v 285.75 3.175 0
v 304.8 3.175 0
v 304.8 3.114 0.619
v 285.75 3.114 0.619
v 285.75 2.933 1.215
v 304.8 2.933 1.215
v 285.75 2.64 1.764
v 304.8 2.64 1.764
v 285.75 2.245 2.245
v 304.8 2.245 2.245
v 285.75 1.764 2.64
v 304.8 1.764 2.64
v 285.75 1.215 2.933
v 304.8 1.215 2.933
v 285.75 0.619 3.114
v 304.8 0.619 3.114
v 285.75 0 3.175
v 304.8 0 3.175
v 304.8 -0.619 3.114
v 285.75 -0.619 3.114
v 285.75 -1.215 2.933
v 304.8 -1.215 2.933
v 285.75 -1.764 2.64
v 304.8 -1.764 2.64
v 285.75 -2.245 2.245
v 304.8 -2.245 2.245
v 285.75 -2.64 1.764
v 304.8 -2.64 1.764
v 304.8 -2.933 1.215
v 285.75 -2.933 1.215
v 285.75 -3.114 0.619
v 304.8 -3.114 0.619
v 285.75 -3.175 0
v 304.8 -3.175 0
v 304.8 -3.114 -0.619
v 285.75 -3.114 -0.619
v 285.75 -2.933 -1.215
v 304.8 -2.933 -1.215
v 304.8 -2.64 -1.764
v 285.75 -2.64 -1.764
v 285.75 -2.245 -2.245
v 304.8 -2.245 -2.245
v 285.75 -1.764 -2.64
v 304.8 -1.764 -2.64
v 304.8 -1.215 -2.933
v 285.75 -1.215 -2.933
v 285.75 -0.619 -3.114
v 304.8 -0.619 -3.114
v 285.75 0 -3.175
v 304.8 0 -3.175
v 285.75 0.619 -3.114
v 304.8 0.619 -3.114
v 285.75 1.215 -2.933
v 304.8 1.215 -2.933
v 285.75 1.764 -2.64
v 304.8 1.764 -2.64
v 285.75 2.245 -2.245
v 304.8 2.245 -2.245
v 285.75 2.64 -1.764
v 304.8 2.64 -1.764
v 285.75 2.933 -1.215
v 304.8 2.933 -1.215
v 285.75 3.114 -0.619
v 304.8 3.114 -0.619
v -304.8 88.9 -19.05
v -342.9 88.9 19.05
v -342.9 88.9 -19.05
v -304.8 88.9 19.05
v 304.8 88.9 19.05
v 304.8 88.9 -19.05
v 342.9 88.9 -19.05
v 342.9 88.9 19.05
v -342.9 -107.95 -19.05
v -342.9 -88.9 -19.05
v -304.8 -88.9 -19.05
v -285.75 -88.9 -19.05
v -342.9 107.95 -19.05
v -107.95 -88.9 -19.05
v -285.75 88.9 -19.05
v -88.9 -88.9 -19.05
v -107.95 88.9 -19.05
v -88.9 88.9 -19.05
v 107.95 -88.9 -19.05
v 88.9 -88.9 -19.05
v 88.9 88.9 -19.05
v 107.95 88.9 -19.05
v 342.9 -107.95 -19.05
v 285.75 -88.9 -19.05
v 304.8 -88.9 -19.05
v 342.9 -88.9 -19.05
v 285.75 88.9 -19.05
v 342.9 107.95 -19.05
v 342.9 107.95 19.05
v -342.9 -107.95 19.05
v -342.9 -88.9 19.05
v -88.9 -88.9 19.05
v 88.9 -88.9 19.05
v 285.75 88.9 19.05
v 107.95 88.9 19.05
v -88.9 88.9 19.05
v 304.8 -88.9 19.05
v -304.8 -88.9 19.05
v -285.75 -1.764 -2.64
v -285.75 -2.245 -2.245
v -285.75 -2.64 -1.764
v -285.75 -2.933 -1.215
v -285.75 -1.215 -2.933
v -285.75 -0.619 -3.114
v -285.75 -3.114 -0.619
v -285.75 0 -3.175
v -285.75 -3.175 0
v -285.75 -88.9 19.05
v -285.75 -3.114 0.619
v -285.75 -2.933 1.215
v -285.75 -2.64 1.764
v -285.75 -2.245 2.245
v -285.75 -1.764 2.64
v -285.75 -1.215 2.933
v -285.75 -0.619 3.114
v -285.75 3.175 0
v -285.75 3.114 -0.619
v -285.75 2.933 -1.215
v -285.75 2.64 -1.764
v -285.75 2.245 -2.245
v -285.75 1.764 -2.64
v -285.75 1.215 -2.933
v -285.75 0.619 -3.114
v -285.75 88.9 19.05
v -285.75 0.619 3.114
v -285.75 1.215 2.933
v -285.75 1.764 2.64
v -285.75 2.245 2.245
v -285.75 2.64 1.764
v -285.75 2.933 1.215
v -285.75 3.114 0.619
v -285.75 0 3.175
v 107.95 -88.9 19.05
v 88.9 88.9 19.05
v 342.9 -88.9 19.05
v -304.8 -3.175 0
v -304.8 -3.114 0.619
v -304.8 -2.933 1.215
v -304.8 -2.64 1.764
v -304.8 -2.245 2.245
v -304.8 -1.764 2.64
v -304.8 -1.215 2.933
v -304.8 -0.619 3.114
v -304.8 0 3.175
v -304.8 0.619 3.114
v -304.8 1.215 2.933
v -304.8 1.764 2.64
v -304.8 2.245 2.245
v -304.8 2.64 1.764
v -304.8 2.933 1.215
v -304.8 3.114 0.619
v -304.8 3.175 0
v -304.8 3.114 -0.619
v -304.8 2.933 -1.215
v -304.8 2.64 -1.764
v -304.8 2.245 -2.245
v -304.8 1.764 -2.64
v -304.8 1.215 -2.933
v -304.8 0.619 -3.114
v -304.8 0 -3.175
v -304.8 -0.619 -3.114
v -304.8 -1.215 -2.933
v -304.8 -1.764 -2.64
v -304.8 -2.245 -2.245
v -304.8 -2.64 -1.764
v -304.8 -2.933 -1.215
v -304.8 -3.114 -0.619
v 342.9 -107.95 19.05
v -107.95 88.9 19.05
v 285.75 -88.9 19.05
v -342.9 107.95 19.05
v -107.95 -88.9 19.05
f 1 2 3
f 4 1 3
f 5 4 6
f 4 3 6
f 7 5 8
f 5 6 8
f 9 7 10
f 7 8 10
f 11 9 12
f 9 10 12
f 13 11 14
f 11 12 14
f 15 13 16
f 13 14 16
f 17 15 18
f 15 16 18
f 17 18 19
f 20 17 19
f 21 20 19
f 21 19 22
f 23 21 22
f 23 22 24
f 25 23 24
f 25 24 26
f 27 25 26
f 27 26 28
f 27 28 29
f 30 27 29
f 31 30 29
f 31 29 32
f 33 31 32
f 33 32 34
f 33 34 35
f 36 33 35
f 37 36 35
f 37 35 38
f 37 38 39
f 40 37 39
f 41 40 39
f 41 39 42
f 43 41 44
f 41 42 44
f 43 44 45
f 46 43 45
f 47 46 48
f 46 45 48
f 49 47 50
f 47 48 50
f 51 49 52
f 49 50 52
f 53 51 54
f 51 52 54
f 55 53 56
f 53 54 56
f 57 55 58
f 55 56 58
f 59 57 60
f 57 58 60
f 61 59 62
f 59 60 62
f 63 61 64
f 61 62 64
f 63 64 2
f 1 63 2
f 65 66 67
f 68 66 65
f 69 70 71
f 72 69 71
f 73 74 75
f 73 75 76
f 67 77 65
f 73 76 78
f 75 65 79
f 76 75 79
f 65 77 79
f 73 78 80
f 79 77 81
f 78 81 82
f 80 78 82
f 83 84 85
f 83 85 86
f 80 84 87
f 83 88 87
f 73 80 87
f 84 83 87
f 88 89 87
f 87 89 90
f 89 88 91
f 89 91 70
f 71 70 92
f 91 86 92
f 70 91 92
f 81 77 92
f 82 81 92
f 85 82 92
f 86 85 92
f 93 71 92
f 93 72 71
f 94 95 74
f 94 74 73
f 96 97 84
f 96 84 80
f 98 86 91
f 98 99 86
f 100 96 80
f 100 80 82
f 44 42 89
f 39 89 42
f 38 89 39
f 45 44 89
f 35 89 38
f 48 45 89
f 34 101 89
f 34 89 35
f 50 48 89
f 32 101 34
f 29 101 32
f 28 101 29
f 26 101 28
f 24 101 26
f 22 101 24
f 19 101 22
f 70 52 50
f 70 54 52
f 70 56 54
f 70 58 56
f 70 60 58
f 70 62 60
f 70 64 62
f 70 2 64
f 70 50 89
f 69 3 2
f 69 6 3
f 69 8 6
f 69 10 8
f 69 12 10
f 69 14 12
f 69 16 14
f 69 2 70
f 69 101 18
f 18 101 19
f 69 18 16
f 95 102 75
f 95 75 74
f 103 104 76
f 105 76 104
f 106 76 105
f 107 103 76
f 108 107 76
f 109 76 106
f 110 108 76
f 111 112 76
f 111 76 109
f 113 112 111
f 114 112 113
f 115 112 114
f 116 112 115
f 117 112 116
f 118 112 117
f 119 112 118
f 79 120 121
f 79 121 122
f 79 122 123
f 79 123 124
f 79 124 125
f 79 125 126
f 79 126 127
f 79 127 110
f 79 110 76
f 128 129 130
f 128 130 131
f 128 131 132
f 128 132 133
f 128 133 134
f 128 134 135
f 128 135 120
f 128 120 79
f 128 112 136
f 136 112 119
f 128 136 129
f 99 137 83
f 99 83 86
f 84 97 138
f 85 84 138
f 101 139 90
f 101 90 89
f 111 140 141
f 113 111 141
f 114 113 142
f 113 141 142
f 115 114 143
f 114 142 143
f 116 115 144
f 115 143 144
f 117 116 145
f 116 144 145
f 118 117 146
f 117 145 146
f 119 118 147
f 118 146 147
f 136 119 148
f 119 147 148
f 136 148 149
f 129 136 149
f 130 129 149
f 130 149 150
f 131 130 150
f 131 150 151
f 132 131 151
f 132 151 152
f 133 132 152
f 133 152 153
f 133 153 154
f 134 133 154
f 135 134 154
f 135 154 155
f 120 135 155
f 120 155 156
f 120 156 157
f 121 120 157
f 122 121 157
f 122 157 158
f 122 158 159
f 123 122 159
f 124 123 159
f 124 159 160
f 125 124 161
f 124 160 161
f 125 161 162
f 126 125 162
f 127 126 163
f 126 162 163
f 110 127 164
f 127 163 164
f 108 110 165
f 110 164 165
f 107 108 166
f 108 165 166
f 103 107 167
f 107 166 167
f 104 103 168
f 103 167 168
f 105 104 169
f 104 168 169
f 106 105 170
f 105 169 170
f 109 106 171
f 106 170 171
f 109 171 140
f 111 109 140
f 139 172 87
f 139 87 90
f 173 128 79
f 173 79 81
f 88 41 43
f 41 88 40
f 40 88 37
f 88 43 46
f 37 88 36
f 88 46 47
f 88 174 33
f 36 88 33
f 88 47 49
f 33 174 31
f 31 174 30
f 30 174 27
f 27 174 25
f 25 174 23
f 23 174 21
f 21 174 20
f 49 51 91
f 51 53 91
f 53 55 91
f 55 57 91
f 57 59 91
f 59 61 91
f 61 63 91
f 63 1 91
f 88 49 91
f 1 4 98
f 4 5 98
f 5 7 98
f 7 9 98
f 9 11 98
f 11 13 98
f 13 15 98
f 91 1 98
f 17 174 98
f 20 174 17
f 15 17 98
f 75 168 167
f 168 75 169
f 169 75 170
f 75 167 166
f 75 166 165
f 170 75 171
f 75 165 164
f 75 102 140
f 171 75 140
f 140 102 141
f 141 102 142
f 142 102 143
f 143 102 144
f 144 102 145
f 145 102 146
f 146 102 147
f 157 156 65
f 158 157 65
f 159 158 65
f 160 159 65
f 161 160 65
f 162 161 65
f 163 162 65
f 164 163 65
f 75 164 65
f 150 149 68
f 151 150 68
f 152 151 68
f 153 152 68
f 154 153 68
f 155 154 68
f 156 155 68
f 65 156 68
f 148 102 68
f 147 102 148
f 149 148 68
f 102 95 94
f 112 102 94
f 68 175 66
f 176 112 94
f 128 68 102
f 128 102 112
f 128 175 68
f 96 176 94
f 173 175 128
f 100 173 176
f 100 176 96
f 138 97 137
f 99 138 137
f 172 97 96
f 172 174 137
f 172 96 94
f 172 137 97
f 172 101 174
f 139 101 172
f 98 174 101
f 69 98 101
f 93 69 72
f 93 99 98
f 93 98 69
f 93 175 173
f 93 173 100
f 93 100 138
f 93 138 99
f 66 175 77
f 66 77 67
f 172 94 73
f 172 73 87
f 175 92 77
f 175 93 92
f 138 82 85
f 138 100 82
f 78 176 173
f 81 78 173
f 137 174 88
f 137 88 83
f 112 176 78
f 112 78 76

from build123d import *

# Parameters (mm, degrees)
F0_W     = 19.05
F0_H     = 177.8
F1_DEPTH = 19.05
F2_R     = 3.175
F3_DEPTH = 25.4
F4_R     = 3.175
F5_DEPTH = 25.4


with BuildPart() as f1:
    # F0 (on Top) → F1 (new body, symmetric)
    with BuildSketch(Plane.XY):
        Polygon((342.9, 107.95), (-342.9, 107.95), (-342.9, 88.9), (-304.8, 88.9), (-285.75, 88.9), (-107.95, 88.9), (-88.9, 88.9), (88.9, 88.9), (107.95, 88.9), (285.75, 88.9), (304.8, 88.9), (342.9, 88.9), align=None)
        with Locations((-295.275, 0)):
            Rectangle(F0_W, F0_H)
        with Locations((295.275, 0)):
            Rectangle(F0_W, F0_H)
        Polygon((-285.75, -88.9), (-304.8, -88.9), (-342.9, -88.9), (-342.9, -107.95), (342.9, -107.95), (342.9, -88.9), (304.8, -88.9), (285.75, -88.9), (107.95, -88.9), (88.9, -88.9), (-88.9, -88.9), (-107.95, -88.9), align=None)
        with Locations((-98.425, 0)):
            Rectangle(F0_W, F0_H)
        with Locations((98.425, 0)):
            Rectangle(F0_W, F0_H)
    extrude(amount=F1_DEPTH, both=True)

    # F2 (on face) → F3 (cut)
    with BuildSketch(Plane(origin=(-304.8, 0, 0), x_dir=(0, -1, 0), z_dir=(-1, 0, 0))):
        Circle(F2_R)
    extrude(amount=-F3_DEPTH, mode=Mode.SUBTRACT)

    # F4 (on face) → F5 (cut)
    with BuildSketch(Plane.YZ.offset(304.8)):
        Circle(F4_R)
    extrude(amount=-F5_DEPTH, mode=Mode.SUBTRACT)


solid = f1.part
